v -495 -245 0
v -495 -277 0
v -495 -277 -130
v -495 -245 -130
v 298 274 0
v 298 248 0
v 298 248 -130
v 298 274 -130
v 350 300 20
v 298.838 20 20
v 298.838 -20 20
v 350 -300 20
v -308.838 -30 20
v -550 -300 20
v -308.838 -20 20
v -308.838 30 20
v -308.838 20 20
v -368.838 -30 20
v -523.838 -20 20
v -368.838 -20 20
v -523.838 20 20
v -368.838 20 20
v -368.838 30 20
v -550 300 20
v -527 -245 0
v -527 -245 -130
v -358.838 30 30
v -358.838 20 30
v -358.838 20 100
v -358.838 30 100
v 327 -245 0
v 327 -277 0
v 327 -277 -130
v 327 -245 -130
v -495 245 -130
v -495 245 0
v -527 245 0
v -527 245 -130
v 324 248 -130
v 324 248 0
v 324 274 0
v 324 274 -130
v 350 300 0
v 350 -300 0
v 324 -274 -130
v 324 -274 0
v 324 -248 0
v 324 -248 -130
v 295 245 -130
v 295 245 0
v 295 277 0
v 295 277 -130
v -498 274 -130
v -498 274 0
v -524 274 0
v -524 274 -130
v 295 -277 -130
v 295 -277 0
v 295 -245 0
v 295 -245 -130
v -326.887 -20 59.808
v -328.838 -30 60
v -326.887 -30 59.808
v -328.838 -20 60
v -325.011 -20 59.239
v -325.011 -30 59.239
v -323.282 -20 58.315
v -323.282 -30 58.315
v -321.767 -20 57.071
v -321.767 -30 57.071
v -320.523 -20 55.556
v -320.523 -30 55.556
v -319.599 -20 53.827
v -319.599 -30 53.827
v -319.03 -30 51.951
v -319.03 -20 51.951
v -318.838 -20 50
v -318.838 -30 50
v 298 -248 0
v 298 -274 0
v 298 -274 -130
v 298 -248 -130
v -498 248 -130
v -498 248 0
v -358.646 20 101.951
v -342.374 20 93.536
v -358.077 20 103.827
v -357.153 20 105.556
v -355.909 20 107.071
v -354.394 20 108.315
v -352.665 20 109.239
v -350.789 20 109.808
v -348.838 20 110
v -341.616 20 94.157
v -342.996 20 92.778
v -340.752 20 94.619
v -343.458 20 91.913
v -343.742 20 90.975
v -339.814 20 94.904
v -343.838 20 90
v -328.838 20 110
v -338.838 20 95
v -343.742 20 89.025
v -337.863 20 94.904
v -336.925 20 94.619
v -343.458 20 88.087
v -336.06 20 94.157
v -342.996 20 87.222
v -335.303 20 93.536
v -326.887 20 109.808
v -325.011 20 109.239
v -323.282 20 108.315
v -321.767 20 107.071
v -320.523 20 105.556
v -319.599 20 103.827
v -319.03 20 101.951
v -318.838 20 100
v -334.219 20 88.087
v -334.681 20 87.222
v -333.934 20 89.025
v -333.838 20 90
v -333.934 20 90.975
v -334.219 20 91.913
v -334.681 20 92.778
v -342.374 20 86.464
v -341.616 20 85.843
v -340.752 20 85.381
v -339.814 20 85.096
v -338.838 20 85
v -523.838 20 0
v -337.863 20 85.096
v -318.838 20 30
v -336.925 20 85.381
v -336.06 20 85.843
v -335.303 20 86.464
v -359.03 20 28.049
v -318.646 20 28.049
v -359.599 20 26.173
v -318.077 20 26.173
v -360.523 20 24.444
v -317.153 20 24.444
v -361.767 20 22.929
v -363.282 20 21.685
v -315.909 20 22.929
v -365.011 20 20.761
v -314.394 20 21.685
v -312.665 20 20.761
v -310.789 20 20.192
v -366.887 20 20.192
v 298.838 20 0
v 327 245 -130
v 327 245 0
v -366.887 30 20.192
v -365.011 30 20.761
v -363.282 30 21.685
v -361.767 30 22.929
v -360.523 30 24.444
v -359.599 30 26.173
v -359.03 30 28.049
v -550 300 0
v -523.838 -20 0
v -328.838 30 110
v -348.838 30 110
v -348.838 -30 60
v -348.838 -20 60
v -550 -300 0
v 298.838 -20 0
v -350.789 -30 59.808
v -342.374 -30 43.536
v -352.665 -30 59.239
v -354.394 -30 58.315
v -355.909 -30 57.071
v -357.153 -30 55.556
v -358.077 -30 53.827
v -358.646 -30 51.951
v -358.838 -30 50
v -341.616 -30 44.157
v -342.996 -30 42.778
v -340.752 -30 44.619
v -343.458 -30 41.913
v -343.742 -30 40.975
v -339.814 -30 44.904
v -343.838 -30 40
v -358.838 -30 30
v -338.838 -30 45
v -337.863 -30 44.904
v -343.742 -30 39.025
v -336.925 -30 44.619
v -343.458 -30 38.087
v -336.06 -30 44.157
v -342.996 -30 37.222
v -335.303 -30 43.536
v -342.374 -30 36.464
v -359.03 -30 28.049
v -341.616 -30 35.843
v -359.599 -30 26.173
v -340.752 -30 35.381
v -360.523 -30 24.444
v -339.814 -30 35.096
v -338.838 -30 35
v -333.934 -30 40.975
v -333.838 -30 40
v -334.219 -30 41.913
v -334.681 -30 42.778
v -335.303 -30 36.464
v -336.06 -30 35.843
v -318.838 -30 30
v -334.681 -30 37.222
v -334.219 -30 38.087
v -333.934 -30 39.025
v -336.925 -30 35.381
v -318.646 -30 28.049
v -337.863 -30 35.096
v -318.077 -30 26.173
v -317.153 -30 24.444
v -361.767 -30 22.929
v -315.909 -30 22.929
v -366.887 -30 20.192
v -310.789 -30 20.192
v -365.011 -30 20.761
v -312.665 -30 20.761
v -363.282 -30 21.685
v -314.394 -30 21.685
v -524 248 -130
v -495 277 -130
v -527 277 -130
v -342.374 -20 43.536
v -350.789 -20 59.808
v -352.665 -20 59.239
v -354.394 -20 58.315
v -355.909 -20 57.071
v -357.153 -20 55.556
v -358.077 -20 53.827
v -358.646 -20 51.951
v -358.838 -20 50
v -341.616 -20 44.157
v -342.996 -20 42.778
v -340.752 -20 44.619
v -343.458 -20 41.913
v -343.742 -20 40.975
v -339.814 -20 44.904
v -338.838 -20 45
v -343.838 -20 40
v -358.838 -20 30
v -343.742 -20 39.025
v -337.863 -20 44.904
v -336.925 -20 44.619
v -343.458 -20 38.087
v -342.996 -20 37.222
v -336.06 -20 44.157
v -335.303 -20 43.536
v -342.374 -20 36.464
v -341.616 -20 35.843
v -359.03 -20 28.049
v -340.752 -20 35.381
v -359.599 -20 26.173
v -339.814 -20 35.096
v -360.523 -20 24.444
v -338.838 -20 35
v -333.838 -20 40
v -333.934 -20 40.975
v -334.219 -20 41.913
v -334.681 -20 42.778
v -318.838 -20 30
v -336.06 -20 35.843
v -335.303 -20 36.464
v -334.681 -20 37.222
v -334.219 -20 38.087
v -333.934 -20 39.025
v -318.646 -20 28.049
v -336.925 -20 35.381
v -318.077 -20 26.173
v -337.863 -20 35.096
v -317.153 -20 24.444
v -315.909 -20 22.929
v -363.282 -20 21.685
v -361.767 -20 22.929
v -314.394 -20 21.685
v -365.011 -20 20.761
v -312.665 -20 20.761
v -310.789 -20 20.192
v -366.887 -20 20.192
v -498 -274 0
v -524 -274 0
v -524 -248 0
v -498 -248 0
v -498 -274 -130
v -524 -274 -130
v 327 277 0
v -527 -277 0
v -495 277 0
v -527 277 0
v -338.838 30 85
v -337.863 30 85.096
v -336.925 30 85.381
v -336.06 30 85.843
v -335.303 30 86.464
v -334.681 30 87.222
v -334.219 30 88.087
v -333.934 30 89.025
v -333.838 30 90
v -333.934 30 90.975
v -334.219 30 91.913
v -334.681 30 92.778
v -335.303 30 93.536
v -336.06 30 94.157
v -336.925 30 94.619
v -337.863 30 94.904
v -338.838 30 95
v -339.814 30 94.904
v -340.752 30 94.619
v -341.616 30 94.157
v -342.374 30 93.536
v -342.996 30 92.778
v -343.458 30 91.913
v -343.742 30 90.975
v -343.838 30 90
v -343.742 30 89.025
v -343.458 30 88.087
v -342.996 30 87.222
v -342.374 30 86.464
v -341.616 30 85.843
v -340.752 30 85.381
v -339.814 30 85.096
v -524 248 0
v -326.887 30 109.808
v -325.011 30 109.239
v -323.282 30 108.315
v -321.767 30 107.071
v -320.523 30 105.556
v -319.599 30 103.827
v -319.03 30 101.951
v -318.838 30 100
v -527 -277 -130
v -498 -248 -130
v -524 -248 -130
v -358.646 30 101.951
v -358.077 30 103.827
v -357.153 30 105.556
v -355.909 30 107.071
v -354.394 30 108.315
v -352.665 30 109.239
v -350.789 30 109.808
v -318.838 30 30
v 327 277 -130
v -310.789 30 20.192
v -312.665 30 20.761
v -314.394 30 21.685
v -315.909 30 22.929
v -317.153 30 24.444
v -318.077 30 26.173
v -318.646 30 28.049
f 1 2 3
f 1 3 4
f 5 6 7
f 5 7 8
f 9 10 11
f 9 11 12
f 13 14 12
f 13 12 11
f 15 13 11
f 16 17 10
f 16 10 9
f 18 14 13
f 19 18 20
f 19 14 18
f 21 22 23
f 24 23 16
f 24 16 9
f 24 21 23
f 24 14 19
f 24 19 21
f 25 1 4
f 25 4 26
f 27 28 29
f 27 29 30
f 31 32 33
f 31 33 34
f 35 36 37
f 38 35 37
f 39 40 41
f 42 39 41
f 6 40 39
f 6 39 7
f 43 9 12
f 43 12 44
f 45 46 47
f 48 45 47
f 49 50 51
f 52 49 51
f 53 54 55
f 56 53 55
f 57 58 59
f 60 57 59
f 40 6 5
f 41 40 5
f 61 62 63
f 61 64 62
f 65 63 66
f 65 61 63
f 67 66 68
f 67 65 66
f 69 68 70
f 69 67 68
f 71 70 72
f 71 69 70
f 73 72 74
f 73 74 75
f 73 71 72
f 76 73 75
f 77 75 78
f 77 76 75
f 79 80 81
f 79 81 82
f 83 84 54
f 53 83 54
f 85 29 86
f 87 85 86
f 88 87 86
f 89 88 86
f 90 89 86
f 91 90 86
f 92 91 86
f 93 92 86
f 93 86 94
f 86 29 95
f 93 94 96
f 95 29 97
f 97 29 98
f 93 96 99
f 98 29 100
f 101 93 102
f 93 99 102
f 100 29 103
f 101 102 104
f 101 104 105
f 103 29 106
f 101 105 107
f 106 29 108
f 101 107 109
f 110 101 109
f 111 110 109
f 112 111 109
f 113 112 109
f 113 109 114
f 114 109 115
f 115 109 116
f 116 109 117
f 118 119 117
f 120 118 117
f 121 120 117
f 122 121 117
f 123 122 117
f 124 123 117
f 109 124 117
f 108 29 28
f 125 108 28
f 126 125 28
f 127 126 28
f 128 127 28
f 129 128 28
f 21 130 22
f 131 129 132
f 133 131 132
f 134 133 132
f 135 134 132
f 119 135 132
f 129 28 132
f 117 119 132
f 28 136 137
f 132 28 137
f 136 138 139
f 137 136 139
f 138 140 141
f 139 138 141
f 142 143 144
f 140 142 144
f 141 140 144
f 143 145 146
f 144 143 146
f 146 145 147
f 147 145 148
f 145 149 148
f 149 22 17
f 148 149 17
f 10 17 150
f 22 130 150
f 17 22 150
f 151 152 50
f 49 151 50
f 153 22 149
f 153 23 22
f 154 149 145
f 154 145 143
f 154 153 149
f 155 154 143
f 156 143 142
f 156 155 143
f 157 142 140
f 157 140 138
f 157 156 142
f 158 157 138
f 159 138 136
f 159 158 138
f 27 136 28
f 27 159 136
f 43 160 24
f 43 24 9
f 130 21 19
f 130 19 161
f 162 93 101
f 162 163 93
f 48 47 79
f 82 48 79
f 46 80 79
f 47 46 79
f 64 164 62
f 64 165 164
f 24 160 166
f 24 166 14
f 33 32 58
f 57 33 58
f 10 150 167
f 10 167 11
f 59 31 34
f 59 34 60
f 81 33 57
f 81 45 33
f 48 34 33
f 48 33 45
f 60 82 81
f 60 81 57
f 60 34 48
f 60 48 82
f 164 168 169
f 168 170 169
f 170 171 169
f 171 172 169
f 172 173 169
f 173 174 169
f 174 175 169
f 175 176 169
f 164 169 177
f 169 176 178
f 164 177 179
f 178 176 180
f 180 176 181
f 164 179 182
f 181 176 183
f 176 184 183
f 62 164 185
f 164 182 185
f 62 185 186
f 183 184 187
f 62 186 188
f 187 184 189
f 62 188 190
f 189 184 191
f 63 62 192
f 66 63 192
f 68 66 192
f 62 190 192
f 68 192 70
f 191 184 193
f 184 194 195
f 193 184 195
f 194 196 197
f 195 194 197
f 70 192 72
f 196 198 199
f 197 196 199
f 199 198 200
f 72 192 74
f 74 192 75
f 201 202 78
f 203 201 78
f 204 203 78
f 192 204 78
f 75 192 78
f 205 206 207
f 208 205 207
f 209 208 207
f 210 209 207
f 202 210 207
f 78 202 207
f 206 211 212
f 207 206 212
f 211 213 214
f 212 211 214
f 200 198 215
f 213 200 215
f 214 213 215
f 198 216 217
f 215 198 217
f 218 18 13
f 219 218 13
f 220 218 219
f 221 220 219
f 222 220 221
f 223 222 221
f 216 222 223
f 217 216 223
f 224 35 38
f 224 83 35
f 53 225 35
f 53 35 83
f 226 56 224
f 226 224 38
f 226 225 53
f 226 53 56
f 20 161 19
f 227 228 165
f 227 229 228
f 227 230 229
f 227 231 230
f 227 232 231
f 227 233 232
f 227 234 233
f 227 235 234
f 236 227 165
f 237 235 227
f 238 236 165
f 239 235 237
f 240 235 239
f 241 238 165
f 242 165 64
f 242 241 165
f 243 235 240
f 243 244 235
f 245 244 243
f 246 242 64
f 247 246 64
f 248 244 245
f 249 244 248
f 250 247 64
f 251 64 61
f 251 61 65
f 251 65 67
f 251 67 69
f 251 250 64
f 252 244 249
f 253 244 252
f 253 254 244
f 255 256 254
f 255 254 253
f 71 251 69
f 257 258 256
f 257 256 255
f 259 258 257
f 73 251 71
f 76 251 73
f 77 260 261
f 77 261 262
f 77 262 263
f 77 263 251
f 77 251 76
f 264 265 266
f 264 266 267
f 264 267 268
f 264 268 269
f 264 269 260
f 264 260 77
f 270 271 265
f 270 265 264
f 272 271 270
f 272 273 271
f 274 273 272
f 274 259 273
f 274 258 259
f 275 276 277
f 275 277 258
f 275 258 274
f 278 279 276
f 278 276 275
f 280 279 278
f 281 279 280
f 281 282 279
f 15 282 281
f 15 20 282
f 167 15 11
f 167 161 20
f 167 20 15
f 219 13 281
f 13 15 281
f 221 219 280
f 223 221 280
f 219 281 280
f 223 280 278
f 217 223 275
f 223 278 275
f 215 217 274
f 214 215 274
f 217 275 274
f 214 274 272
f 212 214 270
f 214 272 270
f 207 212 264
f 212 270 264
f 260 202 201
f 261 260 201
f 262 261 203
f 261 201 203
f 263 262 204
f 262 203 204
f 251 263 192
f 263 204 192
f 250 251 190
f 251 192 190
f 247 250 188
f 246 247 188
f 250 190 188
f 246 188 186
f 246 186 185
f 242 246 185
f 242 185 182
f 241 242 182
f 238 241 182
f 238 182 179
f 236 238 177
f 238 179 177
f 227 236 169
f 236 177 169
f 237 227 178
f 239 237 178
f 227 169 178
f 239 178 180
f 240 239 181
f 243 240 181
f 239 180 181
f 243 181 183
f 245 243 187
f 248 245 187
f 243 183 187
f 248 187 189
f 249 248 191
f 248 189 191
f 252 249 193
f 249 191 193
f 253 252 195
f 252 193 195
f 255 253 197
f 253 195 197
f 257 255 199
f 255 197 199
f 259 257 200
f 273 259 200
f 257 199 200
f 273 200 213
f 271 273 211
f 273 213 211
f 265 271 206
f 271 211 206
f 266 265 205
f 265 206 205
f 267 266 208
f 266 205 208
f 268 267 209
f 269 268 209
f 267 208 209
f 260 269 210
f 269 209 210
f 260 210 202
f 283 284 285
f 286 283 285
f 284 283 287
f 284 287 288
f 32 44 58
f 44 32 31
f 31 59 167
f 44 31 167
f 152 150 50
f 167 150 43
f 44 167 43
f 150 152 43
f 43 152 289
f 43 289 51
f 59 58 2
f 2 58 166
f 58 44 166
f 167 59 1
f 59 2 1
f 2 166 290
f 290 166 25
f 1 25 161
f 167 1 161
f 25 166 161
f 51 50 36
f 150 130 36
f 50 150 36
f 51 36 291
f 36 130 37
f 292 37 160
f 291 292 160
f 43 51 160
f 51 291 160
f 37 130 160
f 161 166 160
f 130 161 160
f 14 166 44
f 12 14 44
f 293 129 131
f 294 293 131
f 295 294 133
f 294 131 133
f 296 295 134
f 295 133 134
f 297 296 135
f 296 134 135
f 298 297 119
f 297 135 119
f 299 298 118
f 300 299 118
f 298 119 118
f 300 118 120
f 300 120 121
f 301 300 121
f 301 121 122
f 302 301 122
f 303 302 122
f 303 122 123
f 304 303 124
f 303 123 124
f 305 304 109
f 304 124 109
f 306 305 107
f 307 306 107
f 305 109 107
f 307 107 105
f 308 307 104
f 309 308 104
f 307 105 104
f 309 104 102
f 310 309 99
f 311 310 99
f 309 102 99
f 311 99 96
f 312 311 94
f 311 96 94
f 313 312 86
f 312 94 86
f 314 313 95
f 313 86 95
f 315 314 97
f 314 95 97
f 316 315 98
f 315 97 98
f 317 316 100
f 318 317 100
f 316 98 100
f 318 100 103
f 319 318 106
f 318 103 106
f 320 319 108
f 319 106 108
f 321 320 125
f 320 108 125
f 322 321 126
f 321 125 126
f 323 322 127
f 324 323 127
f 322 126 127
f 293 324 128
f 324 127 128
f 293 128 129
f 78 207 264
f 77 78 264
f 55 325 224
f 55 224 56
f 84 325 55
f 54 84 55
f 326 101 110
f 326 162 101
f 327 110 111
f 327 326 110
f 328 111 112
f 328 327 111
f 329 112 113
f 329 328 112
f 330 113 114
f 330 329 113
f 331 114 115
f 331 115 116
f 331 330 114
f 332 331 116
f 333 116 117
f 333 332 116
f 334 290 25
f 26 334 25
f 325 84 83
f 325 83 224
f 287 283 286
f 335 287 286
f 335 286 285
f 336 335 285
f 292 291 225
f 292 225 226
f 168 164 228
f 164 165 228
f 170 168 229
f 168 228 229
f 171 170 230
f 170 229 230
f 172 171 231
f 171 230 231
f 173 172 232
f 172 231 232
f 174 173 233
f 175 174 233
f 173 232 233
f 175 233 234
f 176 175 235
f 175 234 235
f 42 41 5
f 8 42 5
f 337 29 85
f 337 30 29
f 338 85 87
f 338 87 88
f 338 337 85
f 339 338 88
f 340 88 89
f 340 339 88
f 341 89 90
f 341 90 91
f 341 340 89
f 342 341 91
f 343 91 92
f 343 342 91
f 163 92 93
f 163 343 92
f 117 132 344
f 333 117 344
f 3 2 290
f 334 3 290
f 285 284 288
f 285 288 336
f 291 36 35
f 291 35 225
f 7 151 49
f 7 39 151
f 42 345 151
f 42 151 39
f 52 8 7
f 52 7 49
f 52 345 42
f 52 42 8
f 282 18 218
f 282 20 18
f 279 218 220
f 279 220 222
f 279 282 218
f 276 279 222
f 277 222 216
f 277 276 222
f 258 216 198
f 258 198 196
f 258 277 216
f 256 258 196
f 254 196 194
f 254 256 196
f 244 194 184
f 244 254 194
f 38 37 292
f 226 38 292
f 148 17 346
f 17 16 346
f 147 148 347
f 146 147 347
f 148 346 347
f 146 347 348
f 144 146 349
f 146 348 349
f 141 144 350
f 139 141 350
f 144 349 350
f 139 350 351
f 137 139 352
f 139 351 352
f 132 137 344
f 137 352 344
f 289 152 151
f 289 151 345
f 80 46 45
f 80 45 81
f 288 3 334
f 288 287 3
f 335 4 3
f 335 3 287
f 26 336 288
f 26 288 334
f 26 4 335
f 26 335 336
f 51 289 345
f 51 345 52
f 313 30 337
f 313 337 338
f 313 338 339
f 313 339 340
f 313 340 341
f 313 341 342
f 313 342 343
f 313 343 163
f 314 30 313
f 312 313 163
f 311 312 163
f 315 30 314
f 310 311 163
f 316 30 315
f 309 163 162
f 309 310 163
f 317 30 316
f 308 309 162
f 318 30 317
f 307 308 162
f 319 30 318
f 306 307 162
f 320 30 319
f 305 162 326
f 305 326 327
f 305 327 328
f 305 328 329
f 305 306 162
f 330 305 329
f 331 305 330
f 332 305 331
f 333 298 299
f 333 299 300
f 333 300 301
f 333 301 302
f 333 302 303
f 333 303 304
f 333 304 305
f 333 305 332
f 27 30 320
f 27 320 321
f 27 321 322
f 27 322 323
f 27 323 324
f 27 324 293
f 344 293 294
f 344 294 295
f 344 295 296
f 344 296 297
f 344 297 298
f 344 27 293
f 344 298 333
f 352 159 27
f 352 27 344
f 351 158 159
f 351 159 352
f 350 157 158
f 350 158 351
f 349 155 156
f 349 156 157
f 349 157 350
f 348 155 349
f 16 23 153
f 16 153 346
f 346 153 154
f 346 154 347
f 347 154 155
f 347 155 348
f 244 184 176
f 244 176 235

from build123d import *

# Parameters (mm, degrees)
SKETCH1_W           = 1300
SKETCH1_H           = 600
SKETCH1_W_2         = 1117.676372874
SKETCH1_H_2         = 40
BOSS_EXTRUDE1_DEPTH = 20
SKETCH2_W           = 40
SKETCH2_H           = 10
BOSS_EXTRUDE2_DEPTH = 40
SKETCH3_R           = 5
CUT_EXTRUDE1_DEPTH  = 10
SKETCH4_W           = 40
SKETCH4_H           = 10
BOSS_EXTRUDE3_DEPTH = 50
SKETCH5_R           = 5
CUT_EXTRUDE2_DEPTH  = 10
FILLET1_R           = 10
FILLET2_R           = 10
FILLET3_R           = 10
FILLET4_R           = 10
FILLET5_R           = 10
FILLET6_R           = 10
FILLET7_R           = 10
FILLET8_R           = 10
SKETCH6_W           = 20
SKETCH6_H           = 40
BOSS_EXTRUDE4_DEPTH = 260
SKETCH7_W           = 20
SKETCH7_H           = 40
BOSS_EXTRUDE5_DEPTH = 35
SKETCH8_W           = 20
SKETCH8_H           = 600
CUT_EXTRUDE3_DEPTH  = 100
SKETCH9_W           = 20
SKETCH9_H           = 600
CUT_EXTRUDE4_DEPTH  = 300
SKETCH10_W          = 32
SKETCH10_H          = 32
SKETCH10_W_2        = 26
SKETCH10_H_2        = 26
BOSS_EXTRUDE6_DEPTH = 130


with BuildPart() as part:
    # Sketch1 → Boss-Extrude1 (new body)
    with BuildSketch(Plane.XY):
        Rectangle(SKETCH1_W, SKETCH1_H)
        Rectangle(SKETCH1_W_2, SKETCH1_H_2, mode=Mode.SUBTRACT)
    extrude(amount=BOSS_EXTRUDE1_DEPTH)

    # Sketch2 → Boss-Extrude2 (add)
    with BuildSketch(Plane.XY.offset(20)):
        with Locations((-338.838186437, 25)):
            Rectangle(SKETCH2_W, SKETCH2_H)
        with Locations((-338.838186437, -25)):
            Rectangle(SKETCH2_W, SKETCH2_H)
    extrude(amount=BOSS_EXTRUDE2_DEPTH)

    # Sketch3 → Cut-Extrude1 (cut)
    with BuildSketch(Plane.XZ.offset(30)):
        with Locations((-338.838186437, 40)):
            Circle(SKETCH3_R)
    extrude(amount=-CUT_EXTRUDE1_DEPTH, mode=Mode.SUBTRACT)

    # Sketch4 → Boss-Extrude3 (add)
    with BuildSketch(Plane.XY.offset(60)):
        with Locations((-338.838186437, 25)):
            Rectangle(SKETCH4_W, SKETCH4_H)
    extrude(amount=BOSS_EXTRUDE3_DEPTH)

    # Sketch5 → Cut-Extrude2 (cut)
    with BuildSketch(Plane.XZ.offset(-20)):
        with Locations(Location((-338.838186437, 90, 0), (0, 0, 270))):
            Circle(SKETCH5_R)
    extrude(amount=-CUT_EXTRUDE2_DEPTH, mode=Mode.SUBTRACT)

    # Fillet1
    fillet1_edges = [part.edges().sort_by_distance(p)[0] for p in [
        (-318.838186437, -25, 20),
    ]]
    fillet(fillet1_edges, radius=FILLET1_R)

    # Fillet2
    fillet2_edges = [part.edges().sort_by_distance(p)[0] for p in [
        (-318.838186437, 25, 20),
    ]]
    fillet(fillet2_edges, radius=FILLET2_R)

    # Fillet3
    fillet3_edges = [part.edges().sort_by_distance(p)[0] for p in [
        (-358.838186437, -25, 20),
    ]]
    fillet(fillet3_edges, radius=FILLET3_R)

    # Fillet4
    fillet4_edges = [part.edges().sort_by_distance(p)[0] for p in [
        (-358.838186437, 25, 20),
    ]]
    fillet(fillet4_edges, radius=FILLET4_R)

    # Fillet5
    fillet5_edges = [part.edges().sort_by_distance(p)[0] for p in [
        (-318.838186437, -25, 60),
    ]]
    fillet(fillet5_edges, radius=FILLET5_R)

    # Fillet6
    fillet6_edges = [part.edges().sort_by_distance(p)[0] for p in [
        (-358.838186437, -25, 60),
    ]]
    fillet(fillet6_edges, radius=FILLET6_R)

    # Fillet7
    fillet7_edges = [part.edges().sort_by_distance(p)[0] for p in [
        (-358.838186437, 25, 110),
    ]]
    fillet(fillet7_edges, radius=FILLET7_R)

    # Fillet8
    fillet8_edges = [part.edges().sort_by_distance(p)[0] for p in [
        (-318.838186437, 25, 110),
    ]]
    fillet(fillet8_edges, radius=FILLET8_R)

    # Sketch6 → Boss-Extrude4 (add)
    with BuildSketch(Plane.ZY.offset(-558.838186437)):
        with Locations((10, 0)):
            Rectangle(SKETCH6_W, SKETCH6_H)
    extrude(amount=BOSS_EXTRUDE4_DEPTH)

    # Sketch7 → Boss-Extrude5 (add)
    with BuildSketch(Plane(origin=(-558.838186437, 0, 0), x_dir=(0, 0, -1), z_dir=(1, 0, 0))):
        with Locations((-10, 0)):
            Rectangle(SKETCH7_W, SKETCH7_H)
    extrude(amount=BOSS_EXTRUDE5_DEPTH)

    # Sketch8 → Cut-Extrude3 (cut)
    with BuildSketch(Plane.ZY.offset(650)):
        with Locations((10, 0)):
            Rectangle(SKETCH8_W, SKETCH8_H)
    extrude(amount=-CUT_EXTRUDE3_DEPTH, mode=Mode.SUBTRACT)

    # Sketch9 → Cut-Extrude4 (cut)
    with BuildSketch(Plane(origin=(650, 0, 0), x_dir=(0, 0, -1), z_dir=(1, 0, 0))):
        with Locations((-10, 0)):
            Rectangle(SKETCH9_W, SKETCH9_H)
    extrude(amount=-CUT_EXTRUDE4_DEPTH, mode=Mode.SUBTRACT)

    # Sketch10 → Boss-Extrude6 (add)
    # profile 1 of 4: a face of its own
    with BuildSketch(Plane(origin=(0, 0, 0), x_dir=(-1, 0, 0), z_dir=(0, 0, -1))):
        with Locations((511, -261)):
            Rectangle(SKETCH10_W, SKETCH10_H)
        with Locations((511, -261)):
            Rectangle(SKETCH10_W_2, SKETCH10_H_2, mode=Mode.SUBTRACT)
    # profile 2 of 4: a face of its own
    with BuildSketch(Plane(origin=(0, 0, 0), x_dir=(-1, 0, 0), z_dir=(0, 0, -1))):
        with Locations((-311, -261)):
            Rectangle(SKETCH10_W, SKETCH10_H)
        with Locations((-311, -261)):
            Rectangle(SKETCH10_W_2, SKETCH10_H_2, mode=Mode.SUBTRACT)
    # profile 3 of 4: a face of its own
    with BuildSketch(Plane(origin=(0, 0, 0), x_dir=(-1, 0, 0), z_dir=(0, 0, -1))):
        with Locations((-311, 261)):
            Rectangle(SKETCH10_W, SKETCH10_H)
        with Locations((-311, 261)):
            Rectangle(SKETCH10_W_2, SKETCH10_H_2, mode=Mode.SUBTRACT)
    # profile 4 of 4: a face of its own
    with BuildSketch(Plane(origin=(0, 0, 0), x_dir=(-1, 0, 0), z_dir=(0, 0, -1))):
        with Locations((511, 261)):
            Rectangle(SKETCH10_W, SKETCH10_H)
        with Locations((511, 261)):
            Rectangle(SKETCH10_W_2, SKETCH10_H_2, mode=Mode.SUBTRACT)
    extrude(amount=BOSS_EXTRUDE6_DEPTH)


solid = part.part
